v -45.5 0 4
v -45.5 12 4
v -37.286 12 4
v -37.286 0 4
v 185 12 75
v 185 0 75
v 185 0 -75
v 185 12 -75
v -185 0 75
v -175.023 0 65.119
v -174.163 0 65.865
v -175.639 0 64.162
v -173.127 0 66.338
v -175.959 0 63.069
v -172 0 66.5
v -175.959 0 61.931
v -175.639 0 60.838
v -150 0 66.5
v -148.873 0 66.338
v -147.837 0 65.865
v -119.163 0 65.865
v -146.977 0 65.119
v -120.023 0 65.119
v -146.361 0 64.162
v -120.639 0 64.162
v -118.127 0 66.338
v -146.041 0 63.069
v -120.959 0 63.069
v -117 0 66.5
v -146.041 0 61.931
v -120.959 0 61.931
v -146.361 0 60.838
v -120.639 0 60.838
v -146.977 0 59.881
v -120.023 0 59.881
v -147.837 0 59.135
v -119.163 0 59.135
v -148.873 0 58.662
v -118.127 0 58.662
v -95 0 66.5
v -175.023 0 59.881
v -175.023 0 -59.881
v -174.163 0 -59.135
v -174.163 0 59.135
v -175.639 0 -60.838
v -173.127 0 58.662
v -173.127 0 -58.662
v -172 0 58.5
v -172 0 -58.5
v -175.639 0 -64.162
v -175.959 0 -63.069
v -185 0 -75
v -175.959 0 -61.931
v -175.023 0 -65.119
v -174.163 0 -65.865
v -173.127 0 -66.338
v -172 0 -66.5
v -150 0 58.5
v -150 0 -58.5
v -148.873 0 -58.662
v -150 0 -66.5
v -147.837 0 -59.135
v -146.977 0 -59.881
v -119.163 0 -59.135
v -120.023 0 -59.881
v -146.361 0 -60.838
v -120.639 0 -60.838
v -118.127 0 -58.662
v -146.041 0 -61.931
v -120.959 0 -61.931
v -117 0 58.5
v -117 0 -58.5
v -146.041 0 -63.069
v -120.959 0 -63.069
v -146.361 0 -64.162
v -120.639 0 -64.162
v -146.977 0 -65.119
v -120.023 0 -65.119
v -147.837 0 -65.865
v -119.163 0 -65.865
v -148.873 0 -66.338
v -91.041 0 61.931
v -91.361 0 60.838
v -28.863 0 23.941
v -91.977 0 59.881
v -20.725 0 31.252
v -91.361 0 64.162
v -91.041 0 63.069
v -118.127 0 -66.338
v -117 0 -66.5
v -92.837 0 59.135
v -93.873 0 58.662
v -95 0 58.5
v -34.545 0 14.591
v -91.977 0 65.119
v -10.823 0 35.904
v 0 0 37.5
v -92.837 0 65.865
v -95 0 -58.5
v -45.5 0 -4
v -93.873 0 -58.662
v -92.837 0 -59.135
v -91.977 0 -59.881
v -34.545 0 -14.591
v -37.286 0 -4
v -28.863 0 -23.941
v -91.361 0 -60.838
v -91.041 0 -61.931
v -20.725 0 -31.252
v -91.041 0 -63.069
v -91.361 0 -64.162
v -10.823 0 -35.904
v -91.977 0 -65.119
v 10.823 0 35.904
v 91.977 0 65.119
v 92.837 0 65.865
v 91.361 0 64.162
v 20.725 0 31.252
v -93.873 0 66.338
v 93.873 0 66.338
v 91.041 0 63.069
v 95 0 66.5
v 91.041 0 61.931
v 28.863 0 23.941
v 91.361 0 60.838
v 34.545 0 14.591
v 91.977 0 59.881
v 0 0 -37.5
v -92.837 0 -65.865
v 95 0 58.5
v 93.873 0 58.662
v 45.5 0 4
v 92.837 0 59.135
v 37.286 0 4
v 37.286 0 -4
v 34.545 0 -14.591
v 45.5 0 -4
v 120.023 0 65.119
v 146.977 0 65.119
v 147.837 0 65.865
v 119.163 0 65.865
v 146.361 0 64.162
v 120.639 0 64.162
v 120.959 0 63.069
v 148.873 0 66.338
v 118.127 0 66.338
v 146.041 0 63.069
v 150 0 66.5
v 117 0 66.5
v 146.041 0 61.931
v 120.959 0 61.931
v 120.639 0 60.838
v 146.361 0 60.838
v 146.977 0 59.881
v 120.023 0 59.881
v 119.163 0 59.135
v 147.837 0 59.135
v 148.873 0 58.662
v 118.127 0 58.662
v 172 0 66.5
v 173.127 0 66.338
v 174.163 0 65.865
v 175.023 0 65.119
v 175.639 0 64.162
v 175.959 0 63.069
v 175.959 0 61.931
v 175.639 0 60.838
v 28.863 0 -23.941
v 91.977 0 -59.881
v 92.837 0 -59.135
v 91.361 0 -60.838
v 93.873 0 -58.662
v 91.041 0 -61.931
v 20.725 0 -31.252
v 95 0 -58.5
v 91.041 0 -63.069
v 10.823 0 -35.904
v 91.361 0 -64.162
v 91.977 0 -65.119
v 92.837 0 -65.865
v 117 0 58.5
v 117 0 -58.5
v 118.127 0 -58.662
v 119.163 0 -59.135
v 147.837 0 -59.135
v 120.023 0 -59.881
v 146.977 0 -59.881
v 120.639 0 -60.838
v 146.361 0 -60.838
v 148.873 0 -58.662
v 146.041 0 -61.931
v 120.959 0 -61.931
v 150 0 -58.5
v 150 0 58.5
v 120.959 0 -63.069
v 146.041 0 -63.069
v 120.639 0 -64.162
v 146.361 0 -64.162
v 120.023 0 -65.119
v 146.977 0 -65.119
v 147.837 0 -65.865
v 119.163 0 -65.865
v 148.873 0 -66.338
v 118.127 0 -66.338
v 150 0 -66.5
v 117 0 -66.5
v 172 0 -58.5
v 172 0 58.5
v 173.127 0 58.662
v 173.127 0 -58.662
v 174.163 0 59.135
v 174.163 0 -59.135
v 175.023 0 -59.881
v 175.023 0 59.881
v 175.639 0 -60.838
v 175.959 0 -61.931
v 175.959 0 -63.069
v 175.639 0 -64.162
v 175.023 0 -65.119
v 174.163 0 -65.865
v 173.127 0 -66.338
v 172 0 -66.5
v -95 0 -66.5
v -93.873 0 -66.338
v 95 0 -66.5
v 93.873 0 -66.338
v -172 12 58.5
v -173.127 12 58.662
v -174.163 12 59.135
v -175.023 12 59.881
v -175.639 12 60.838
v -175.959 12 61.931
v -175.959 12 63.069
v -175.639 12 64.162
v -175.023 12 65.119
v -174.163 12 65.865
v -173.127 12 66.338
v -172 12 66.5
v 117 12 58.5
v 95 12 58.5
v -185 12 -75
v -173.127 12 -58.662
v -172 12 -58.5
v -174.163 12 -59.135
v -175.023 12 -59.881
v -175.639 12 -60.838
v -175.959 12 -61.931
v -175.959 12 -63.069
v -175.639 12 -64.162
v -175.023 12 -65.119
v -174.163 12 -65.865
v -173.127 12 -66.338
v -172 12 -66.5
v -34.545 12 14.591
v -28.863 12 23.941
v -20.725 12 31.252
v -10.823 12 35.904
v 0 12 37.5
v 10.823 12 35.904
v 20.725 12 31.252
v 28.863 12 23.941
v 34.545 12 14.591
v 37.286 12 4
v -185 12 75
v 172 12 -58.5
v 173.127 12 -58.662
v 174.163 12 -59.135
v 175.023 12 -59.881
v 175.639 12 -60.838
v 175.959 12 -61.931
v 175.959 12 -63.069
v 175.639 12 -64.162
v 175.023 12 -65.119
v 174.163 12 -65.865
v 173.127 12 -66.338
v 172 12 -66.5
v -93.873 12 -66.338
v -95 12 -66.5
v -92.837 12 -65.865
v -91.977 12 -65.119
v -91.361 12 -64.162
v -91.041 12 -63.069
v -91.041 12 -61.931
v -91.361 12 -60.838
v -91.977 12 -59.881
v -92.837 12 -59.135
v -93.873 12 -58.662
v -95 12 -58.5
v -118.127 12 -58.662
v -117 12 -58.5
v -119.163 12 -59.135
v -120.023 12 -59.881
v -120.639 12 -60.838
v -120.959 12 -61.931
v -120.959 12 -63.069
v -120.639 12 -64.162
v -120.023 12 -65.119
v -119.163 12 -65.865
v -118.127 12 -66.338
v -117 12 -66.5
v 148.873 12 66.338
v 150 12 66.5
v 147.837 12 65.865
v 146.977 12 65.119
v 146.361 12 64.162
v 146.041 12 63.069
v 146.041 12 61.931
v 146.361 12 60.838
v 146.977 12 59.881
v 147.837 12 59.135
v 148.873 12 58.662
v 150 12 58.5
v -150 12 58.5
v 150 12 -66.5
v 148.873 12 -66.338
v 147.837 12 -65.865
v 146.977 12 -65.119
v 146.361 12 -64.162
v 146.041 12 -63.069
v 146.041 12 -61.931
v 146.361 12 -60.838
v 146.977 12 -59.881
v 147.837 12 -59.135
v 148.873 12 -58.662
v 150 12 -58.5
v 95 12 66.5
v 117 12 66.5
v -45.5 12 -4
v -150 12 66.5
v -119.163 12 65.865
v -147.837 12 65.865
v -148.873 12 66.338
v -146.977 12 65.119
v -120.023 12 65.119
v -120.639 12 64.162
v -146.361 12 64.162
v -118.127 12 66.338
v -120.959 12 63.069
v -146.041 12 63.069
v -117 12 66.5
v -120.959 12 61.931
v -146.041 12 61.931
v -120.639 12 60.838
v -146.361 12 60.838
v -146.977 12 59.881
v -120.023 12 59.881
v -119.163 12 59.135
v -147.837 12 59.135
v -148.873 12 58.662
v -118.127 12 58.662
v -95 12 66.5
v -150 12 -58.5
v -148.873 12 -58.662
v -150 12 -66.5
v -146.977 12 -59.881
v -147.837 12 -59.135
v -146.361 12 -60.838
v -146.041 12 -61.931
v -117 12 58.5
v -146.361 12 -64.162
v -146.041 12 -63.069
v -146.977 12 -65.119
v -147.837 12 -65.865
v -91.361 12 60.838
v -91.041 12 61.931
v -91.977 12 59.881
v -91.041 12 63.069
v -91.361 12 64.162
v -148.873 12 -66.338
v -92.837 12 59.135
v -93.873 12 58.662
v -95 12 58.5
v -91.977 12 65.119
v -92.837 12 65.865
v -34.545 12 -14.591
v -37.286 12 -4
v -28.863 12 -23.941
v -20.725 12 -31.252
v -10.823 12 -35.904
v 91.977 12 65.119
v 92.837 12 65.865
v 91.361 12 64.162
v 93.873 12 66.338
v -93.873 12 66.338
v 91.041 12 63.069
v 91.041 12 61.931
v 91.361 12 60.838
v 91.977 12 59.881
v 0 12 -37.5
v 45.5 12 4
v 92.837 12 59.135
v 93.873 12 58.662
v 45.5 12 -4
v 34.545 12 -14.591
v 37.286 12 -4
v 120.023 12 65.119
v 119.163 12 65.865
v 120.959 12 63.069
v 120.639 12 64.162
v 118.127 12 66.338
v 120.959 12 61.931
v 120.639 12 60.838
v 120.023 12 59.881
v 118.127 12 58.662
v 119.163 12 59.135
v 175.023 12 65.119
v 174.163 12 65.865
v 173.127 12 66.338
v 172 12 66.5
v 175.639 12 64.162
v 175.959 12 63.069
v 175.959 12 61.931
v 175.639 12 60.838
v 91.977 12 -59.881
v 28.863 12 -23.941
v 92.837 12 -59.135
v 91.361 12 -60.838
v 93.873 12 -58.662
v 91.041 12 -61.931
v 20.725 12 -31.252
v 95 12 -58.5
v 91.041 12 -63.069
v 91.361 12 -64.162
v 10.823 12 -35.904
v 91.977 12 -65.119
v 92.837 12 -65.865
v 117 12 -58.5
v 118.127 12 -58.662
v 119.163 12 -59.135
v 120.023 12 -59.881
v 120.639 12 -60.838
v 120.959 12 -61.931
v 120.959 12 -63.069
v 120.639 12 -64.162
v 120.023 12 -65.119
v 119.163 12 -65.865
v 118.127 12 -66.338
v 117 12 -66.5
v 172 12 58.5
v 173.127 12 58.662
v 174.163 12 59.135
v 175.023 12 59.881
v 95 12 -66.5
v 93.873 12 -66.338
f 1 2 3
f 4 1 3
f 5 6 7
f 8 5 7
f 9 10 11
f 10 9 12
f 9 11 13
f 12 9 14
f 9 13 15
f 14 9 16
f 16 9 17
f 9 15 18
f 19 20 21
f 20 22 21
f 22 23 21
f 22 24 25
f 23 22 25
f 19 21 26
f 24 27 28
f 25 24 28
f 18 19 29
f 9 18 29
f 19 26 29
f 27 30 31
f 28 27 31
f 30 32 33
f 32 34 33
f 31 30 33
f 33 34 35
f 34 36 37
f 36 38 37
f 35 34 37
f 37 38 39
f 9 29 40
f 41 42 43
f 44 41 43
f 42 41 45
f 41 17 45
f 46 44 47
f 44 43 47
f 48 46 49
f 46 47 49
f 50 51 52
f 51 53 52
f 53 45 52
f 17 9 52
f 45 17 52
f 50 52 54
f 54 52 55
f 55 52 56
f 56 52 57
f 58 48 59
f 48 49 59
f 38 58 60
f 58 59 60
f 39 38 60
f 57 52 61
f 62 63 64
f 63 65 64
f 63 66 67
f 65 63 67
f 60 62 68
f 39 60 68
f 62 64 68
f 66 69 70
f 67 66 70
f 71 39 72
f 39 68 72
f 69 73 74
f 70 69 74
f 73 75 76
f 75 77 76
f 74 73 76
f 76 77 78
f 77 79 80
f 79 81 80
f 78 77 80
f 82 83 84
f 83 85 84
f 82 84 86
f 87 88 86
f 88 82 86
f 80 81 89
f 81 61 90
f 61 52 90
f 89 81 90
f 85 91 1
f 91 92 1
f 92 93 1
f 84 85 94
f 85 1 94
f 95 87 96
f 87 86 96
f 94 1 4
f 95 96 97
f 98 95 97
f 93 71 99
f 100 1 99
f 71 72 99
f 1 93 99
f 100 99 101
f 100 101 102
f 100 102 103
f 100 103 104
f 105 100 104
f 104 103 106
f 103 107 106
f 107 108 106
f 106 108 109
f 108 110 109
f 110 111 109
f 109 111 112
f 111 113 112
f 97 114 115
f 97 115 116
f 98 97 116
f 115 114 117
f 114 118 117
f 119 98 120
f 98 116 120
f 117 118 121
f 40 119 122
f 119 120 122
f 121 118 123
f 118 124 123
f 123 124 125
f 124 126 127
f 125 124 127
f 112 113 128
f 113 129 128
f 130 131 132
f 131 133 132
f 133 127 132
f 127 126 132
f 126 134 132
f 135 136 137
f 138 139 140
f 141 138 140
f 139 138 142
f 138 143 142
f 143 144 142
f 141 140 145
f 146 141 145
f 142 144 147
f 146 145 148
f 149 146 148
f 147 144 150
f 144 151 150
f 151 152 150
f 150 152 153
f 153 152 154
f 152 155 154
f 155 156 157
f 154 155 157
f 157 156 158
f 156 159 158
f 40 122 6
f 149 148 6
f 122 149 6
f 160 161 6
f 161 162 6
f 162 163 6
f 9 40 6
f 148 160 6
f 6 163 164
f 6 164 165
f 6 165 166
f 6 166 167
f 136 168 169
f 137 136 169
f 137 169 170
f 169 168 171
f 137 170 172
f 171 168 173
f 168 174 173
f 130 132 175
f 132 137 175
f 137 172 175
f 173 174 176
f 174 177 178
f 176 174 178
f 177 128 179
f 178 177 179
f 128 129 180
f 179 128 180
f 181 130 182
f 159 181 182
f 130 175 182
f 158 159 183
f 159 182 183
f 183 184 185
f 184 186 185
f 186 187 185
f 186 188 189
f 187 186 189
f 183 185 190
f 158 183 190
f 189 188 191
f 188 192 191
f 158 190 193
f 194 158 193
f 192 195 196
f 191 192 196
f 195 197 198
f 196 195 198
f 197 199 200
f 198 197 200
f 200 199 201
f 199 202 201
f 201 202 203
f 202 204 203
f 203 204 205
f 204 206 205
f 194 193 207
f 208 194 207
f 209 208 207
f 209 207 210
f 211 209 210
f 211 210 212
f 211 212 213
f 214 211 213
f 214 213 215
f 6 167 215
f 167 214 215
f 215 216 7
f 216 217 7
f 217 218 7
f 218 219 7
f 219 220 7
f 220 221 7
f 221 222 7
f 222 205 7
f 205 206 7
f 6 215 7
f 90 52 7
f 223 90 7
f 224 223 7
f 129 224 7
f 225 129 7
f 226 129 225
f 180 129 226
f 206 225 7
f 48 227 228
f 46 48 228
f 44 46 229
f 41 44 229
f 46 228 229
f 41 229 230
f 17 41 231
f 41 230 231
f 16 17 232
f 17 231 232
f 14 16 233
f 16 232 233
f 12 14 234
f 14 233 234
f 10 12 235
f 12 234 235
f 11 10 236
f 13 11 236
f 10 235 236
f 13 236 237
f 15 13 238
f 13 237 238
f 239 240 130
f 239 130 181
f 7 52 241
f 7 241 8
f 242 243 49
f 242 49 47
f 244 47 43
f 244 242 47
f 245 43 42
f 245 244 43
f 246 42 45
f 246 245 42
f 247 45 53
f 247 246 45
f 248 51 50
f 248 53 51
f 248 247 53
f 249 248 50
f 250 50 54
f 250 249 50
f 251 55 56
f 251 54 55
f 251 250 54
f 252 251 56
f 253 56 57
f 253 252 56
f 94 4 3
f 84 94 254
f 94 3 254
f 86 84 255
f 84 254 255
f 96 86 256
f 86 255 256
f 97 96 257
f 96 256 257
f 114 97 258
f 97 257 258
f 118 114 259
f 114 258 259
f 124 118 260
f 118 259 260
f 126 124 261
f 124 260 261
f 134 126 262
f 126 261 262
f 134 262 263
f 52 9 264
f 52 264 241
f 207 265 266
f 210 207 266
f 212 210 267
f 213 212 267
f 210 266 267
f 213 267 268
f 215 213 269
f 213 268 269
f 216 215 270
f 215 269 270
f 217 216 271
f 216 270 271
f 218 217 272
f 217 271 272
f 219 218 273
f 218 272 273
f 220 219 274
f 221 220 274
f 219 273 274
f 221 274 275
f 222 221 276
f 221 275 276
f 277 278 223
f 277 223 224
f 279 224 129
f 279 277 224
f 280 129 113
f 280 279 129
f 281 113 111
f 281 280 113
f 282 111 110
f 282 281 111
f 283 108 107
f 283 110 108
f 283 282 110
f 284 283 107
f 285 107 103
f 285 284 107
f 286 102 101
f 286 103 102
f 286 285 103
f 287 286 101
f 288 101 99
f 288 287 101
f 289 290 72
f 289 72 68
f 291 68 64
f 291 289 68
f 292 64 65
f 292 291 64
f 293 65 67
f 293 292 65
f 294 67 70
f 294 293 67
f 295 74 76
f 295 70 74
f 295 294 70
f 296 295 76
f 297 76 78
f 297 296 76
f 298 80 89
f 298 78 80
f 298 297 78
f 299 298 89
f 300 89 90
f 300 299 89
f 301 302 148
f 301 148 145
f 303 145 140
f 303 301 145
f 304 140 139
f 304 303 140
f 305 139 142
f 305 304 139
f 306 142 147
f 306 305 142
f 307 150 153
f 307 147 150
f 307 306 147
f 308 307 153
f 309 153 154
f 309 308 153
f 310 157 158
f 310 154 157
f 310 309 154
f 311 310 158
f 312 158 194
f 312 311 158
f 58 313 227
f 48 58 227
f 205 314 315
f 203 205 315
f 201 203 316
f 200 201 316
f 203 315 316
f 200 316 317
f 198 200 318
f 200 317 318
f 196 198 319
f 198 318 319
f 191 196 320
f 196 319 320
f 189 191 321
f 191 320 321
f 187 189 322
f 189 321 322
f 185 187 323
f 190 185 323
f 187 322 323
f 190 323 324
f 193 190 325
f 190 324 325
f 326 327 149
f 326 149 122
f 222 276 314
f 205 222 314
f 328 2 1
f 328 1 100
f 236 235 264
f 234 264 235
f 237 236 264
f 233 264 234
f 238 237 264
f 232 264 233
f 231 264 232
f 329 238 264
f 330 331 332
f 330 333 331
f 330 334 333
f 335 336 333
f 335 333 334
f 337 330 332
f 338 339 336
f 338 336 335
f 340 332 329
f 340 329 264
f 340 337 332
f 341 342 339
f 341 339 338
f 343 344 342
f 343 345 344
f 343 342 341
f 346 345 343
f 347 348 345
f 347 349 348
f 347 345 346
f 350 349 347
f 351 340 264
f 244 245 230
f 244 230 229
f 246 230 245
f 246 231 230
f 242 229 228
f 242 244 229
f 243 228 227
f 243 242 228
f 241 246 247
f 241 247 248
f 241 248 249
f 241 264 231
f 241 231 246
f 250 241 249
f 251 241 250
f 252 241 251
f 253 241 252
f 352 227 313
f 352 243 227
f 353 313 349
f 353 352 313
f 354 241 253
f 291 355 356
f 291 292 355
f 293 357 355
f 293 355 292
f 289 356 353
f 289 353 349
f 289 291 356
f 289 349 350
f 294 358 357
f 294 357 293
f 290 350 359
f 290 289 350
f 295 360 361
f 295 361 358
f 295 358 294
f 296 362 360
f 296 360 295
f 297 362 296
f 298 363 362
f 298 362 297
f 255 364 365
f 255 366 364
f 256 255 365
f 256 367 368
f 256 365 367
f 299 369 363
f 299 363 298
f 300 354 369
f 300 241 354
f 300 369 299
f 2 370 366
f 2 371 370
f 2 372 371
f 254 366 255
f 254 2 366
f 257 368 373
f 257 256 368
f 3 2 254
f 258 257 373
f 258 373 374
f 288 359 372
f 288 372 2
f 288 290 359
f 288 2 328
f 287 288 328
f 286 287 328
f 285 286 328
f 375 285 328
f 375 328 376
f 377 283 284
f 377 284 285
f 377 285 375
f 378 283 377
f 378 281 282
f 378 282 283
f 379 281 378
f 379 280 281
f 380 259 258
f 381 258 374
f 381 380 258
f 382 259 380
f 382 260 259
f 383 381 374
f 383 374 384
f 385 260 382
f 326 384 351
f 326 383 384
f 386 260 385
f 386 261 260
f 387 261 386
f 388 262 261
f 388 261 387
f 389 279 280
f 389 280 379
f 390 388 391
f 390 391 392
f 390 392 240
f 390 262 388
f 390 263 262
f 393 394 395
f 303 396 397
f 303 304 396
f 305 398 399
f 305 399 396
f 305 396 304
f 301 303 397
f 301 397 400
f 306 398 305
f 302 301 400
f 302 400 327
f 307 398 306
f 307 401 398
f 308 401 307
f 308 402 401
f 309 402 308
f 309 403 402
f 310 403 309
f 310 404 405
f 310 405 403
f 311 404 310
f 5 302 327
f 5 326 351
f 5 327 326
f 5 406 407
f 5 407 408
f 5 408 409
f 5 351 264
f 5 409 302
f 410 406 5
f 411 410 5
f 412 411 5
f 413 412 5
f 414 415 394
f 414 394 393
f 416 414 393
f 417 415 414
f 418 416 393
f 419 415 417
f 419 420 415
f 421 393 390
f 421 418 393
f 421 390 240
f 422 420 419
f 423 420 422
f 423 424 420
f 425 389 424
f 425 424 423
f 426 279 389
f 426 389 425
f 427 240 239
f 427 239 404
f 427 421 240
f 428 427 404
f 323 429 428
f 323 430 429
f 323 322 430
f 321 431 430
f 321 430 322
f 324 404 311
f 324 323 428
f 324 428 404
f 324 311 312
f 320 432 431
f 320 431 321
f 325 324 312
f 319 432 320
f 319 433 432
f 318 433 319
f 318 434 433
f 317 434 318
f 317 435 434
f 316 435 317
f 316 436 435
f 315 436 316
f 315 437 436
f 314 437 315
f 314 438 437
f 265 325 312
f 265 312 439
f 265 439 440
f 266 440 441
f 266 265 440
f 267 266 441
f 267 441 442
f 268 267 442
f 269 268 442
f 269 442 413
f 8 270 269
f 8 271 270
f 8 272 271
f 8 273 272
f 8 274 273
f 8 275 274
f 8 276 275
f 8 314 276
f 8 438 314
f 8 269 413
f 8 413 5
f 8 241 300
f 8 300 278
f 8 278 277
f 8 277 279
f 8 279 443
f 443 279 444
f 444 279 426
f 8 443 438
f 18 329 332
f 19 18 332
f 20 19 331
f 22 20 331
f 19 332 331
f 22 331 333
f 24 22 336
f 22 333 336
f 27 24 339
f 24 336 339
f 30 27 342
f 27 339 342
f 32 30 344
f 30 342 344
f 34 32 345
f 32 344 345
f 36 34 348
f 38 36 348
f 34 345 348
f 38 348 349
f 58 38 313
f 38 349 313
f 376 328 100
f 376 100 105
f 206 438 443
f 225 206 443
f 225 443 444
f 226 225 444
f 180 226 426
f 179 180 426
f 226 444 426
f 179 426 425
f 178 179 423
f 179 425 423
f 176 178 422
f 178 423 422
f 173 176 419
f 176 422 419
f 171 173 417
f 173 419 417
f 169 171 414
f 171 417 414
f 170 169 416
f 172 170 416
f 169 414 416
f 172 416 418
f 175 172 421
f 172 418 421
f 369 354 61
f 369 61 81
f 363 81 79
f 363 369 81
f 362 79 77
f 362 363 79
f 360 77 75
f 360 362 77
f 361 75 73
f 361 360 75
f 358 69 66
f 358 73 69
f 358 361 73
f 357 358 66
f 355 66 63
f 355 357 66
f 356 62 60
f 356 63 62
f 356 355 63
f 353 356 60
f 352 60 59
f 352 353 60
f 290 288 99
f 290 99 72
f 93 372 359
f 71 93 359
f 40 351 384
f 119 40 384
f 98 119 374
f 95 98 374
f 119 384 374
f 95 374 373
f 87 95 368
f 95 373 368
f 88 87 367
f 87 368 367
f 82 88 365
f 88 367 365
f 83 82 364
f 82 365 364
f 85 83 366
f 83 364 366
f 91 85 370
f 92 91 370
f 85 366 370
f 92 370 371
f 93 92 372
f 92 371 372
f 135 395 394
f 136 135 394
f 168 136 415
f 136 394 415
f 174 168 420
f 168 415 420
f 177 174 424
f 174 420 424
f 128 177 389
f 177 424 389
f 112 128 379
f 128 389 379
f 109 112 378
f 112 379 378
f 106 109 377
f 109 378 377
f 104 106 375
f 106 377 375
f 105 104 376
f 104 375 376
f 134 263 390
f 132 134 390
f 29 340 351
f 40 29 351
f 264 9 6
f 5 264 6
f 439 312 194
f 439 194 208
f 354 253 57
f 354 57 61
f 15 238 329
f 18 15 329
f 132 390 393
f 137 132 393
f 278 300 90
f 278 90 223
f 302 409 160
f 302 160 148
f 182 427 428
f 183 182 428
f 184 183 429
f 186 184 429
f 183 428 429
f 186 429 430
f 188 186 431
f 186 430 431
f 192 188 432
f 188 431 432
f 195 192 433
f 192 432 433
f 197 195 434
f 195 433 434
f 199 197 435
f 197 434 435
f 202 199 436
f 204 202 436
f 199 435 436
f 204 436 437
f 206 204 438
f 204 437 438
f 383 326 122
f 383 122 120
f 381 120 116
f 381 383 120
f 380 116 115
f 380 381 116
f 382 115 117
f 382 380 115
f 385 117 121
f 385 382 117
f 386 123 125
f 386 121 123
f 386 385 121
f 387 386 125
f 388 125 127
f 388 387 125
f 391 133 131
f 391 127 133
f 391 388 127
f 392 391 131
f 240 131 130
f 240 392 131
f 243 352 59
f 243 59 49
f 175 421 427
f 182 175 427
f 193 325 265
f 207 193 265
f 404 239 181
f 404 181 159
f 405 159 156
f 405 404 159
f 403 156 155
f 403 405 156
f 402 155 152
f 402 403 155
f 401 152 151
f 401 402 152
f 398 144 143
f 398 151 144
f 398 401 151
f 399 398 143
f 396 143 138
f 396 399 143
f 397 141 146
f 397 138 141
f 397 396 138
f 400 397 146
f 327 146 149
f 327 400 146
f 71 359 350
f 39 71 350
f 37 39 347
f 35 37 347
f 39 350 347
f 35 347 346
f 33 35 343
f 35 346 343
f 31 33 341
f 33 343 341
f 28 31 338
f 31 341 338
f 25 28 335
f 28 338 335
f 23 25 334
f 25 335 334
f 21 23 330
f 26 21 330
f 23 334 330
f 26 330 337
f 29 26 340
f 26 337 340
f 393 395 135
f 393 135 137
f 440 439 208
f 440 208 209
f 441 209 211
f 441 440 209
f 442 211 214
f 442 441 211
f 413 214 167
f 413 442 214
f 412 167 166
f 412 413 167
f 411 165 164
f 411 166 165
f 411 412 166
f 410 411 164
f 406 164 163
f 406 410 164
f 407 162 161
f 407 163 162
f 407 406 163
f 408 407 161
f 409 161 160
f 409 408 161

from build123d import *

# Parameters (mm, degrees)
SKETCH1_W           = 370
SKETCH1_H           = 150
BOSS_EXTRUDE1_DEPTH = 12
SKETCH3_R           = 37.5
CUT_EXTRUDE2_DEPTH  = 13
SKETCH6_W           = 91
SKETCH6_H           = 8
CUT_EXTRUDE3_DEPTH  = 13
CUT_EXTRUDE4_DEPTH  = 13


with BuildPart() as part:
    # Sketch1 → Boss-Extrude1 (new body)
    with BuildSketch(Plane(origin=(0, 0, 0), x_dir=(1, 0, 0), z_dir=(0, 1, 0))):
        Rectangle(SKETCH1_W, SKETCH1_H)
    extrude(amount=BOSS_EXTRUDE1_DEPTH)

    # Sketch3 → Cut-Extrude2 (cut, through all)
    with BuildSketch(Plane(origin=(0, 12, 0), x_dir=(1, 0, 0), z_dir=(0, 1, 0))):
        Circle(SKETCH3_R)
    extrude(amount=-CUT_EXTRUDE2_DEPTH, mode=Mode.SUBTRACT)

    # Sketch6 → Cut-Extrude3 (cut, through all)
    with BuildSketch(Plane(origin=(0, 12, 0), x_dir=(1, 0, 0), z_dir=(0, 1, 0))):
        Rectangle(SKETCH6_W, SKETCH6_H)
    extrude(amount=-CUT_EXTRUDE3_DEPTH, mode=Mode.SUBTRACT)

    # Sketch7 → Cut-Extrude4 (cut, through all)
    with BuildSketch(Plane(origin=(0, 12, 0), x_dir=(1, 0, 0), z_dir=(0, 1, 0))):
        with BuildLine():
            Line((-150, -58.5), (-172, -58.5))
            ThreePointArc((-172, -58.5), (-176, -62.5), (-172, -66.5))
            Line((-172, -66.5), (-150, -66.5))
            ThreePointArc((-150, -66.5), (-146, -62.5), (-150, -58.5))
        make_face()
        with BuildLine():
            ThreePointArc((-172, 58.5), (-176, 62.5), (-172, 66.5))
            Line((-172, 66.5), (-150, 66.5))
            ThreePointArc((-150, 66.5), (-146, 62.5), (-150, 58.5))
            Line((-150, 58.5), (-172, 58.5))
        make_face()
        with BuildLine():
            ThreePointArc((-117, 58.5), (-121, 62.5), (-117, 66.5))
            Line((-117, 66.5), (-95, 66.5))
            ThreePointArc((-95, 66.5), (-91, 62.5), (-95, 58.5))
            Line((-95, 58.5), (-117, 58.5))
        make_face()
        with BuildLine():
            Line((-95, -58.5), (-117, -58.5))
            ThreePointArc((-117, -58.5), (-121, -62.5), (-117, -66.5))
            Line((-117, -66.5), (-95, -66.5))
            ThreePointArc((-95, -66.5), (-91, -62.5), (-95, -58.5))
        make_face()
    cut_extrude4 = extrude(amount=-CUT_EXTRUDE4_DEPTH, mode=Mode.SUBTRACT)

    # Mirror1: Cut-Extrude4 across plane
    add(cut_extrude4.mirror(Plane(origin=(0, 0, 0), x_dir=(0, 0, 1), z_dir=(1, 0, 0))), mode=Mode.SUBTRACT)


solid = part.part
